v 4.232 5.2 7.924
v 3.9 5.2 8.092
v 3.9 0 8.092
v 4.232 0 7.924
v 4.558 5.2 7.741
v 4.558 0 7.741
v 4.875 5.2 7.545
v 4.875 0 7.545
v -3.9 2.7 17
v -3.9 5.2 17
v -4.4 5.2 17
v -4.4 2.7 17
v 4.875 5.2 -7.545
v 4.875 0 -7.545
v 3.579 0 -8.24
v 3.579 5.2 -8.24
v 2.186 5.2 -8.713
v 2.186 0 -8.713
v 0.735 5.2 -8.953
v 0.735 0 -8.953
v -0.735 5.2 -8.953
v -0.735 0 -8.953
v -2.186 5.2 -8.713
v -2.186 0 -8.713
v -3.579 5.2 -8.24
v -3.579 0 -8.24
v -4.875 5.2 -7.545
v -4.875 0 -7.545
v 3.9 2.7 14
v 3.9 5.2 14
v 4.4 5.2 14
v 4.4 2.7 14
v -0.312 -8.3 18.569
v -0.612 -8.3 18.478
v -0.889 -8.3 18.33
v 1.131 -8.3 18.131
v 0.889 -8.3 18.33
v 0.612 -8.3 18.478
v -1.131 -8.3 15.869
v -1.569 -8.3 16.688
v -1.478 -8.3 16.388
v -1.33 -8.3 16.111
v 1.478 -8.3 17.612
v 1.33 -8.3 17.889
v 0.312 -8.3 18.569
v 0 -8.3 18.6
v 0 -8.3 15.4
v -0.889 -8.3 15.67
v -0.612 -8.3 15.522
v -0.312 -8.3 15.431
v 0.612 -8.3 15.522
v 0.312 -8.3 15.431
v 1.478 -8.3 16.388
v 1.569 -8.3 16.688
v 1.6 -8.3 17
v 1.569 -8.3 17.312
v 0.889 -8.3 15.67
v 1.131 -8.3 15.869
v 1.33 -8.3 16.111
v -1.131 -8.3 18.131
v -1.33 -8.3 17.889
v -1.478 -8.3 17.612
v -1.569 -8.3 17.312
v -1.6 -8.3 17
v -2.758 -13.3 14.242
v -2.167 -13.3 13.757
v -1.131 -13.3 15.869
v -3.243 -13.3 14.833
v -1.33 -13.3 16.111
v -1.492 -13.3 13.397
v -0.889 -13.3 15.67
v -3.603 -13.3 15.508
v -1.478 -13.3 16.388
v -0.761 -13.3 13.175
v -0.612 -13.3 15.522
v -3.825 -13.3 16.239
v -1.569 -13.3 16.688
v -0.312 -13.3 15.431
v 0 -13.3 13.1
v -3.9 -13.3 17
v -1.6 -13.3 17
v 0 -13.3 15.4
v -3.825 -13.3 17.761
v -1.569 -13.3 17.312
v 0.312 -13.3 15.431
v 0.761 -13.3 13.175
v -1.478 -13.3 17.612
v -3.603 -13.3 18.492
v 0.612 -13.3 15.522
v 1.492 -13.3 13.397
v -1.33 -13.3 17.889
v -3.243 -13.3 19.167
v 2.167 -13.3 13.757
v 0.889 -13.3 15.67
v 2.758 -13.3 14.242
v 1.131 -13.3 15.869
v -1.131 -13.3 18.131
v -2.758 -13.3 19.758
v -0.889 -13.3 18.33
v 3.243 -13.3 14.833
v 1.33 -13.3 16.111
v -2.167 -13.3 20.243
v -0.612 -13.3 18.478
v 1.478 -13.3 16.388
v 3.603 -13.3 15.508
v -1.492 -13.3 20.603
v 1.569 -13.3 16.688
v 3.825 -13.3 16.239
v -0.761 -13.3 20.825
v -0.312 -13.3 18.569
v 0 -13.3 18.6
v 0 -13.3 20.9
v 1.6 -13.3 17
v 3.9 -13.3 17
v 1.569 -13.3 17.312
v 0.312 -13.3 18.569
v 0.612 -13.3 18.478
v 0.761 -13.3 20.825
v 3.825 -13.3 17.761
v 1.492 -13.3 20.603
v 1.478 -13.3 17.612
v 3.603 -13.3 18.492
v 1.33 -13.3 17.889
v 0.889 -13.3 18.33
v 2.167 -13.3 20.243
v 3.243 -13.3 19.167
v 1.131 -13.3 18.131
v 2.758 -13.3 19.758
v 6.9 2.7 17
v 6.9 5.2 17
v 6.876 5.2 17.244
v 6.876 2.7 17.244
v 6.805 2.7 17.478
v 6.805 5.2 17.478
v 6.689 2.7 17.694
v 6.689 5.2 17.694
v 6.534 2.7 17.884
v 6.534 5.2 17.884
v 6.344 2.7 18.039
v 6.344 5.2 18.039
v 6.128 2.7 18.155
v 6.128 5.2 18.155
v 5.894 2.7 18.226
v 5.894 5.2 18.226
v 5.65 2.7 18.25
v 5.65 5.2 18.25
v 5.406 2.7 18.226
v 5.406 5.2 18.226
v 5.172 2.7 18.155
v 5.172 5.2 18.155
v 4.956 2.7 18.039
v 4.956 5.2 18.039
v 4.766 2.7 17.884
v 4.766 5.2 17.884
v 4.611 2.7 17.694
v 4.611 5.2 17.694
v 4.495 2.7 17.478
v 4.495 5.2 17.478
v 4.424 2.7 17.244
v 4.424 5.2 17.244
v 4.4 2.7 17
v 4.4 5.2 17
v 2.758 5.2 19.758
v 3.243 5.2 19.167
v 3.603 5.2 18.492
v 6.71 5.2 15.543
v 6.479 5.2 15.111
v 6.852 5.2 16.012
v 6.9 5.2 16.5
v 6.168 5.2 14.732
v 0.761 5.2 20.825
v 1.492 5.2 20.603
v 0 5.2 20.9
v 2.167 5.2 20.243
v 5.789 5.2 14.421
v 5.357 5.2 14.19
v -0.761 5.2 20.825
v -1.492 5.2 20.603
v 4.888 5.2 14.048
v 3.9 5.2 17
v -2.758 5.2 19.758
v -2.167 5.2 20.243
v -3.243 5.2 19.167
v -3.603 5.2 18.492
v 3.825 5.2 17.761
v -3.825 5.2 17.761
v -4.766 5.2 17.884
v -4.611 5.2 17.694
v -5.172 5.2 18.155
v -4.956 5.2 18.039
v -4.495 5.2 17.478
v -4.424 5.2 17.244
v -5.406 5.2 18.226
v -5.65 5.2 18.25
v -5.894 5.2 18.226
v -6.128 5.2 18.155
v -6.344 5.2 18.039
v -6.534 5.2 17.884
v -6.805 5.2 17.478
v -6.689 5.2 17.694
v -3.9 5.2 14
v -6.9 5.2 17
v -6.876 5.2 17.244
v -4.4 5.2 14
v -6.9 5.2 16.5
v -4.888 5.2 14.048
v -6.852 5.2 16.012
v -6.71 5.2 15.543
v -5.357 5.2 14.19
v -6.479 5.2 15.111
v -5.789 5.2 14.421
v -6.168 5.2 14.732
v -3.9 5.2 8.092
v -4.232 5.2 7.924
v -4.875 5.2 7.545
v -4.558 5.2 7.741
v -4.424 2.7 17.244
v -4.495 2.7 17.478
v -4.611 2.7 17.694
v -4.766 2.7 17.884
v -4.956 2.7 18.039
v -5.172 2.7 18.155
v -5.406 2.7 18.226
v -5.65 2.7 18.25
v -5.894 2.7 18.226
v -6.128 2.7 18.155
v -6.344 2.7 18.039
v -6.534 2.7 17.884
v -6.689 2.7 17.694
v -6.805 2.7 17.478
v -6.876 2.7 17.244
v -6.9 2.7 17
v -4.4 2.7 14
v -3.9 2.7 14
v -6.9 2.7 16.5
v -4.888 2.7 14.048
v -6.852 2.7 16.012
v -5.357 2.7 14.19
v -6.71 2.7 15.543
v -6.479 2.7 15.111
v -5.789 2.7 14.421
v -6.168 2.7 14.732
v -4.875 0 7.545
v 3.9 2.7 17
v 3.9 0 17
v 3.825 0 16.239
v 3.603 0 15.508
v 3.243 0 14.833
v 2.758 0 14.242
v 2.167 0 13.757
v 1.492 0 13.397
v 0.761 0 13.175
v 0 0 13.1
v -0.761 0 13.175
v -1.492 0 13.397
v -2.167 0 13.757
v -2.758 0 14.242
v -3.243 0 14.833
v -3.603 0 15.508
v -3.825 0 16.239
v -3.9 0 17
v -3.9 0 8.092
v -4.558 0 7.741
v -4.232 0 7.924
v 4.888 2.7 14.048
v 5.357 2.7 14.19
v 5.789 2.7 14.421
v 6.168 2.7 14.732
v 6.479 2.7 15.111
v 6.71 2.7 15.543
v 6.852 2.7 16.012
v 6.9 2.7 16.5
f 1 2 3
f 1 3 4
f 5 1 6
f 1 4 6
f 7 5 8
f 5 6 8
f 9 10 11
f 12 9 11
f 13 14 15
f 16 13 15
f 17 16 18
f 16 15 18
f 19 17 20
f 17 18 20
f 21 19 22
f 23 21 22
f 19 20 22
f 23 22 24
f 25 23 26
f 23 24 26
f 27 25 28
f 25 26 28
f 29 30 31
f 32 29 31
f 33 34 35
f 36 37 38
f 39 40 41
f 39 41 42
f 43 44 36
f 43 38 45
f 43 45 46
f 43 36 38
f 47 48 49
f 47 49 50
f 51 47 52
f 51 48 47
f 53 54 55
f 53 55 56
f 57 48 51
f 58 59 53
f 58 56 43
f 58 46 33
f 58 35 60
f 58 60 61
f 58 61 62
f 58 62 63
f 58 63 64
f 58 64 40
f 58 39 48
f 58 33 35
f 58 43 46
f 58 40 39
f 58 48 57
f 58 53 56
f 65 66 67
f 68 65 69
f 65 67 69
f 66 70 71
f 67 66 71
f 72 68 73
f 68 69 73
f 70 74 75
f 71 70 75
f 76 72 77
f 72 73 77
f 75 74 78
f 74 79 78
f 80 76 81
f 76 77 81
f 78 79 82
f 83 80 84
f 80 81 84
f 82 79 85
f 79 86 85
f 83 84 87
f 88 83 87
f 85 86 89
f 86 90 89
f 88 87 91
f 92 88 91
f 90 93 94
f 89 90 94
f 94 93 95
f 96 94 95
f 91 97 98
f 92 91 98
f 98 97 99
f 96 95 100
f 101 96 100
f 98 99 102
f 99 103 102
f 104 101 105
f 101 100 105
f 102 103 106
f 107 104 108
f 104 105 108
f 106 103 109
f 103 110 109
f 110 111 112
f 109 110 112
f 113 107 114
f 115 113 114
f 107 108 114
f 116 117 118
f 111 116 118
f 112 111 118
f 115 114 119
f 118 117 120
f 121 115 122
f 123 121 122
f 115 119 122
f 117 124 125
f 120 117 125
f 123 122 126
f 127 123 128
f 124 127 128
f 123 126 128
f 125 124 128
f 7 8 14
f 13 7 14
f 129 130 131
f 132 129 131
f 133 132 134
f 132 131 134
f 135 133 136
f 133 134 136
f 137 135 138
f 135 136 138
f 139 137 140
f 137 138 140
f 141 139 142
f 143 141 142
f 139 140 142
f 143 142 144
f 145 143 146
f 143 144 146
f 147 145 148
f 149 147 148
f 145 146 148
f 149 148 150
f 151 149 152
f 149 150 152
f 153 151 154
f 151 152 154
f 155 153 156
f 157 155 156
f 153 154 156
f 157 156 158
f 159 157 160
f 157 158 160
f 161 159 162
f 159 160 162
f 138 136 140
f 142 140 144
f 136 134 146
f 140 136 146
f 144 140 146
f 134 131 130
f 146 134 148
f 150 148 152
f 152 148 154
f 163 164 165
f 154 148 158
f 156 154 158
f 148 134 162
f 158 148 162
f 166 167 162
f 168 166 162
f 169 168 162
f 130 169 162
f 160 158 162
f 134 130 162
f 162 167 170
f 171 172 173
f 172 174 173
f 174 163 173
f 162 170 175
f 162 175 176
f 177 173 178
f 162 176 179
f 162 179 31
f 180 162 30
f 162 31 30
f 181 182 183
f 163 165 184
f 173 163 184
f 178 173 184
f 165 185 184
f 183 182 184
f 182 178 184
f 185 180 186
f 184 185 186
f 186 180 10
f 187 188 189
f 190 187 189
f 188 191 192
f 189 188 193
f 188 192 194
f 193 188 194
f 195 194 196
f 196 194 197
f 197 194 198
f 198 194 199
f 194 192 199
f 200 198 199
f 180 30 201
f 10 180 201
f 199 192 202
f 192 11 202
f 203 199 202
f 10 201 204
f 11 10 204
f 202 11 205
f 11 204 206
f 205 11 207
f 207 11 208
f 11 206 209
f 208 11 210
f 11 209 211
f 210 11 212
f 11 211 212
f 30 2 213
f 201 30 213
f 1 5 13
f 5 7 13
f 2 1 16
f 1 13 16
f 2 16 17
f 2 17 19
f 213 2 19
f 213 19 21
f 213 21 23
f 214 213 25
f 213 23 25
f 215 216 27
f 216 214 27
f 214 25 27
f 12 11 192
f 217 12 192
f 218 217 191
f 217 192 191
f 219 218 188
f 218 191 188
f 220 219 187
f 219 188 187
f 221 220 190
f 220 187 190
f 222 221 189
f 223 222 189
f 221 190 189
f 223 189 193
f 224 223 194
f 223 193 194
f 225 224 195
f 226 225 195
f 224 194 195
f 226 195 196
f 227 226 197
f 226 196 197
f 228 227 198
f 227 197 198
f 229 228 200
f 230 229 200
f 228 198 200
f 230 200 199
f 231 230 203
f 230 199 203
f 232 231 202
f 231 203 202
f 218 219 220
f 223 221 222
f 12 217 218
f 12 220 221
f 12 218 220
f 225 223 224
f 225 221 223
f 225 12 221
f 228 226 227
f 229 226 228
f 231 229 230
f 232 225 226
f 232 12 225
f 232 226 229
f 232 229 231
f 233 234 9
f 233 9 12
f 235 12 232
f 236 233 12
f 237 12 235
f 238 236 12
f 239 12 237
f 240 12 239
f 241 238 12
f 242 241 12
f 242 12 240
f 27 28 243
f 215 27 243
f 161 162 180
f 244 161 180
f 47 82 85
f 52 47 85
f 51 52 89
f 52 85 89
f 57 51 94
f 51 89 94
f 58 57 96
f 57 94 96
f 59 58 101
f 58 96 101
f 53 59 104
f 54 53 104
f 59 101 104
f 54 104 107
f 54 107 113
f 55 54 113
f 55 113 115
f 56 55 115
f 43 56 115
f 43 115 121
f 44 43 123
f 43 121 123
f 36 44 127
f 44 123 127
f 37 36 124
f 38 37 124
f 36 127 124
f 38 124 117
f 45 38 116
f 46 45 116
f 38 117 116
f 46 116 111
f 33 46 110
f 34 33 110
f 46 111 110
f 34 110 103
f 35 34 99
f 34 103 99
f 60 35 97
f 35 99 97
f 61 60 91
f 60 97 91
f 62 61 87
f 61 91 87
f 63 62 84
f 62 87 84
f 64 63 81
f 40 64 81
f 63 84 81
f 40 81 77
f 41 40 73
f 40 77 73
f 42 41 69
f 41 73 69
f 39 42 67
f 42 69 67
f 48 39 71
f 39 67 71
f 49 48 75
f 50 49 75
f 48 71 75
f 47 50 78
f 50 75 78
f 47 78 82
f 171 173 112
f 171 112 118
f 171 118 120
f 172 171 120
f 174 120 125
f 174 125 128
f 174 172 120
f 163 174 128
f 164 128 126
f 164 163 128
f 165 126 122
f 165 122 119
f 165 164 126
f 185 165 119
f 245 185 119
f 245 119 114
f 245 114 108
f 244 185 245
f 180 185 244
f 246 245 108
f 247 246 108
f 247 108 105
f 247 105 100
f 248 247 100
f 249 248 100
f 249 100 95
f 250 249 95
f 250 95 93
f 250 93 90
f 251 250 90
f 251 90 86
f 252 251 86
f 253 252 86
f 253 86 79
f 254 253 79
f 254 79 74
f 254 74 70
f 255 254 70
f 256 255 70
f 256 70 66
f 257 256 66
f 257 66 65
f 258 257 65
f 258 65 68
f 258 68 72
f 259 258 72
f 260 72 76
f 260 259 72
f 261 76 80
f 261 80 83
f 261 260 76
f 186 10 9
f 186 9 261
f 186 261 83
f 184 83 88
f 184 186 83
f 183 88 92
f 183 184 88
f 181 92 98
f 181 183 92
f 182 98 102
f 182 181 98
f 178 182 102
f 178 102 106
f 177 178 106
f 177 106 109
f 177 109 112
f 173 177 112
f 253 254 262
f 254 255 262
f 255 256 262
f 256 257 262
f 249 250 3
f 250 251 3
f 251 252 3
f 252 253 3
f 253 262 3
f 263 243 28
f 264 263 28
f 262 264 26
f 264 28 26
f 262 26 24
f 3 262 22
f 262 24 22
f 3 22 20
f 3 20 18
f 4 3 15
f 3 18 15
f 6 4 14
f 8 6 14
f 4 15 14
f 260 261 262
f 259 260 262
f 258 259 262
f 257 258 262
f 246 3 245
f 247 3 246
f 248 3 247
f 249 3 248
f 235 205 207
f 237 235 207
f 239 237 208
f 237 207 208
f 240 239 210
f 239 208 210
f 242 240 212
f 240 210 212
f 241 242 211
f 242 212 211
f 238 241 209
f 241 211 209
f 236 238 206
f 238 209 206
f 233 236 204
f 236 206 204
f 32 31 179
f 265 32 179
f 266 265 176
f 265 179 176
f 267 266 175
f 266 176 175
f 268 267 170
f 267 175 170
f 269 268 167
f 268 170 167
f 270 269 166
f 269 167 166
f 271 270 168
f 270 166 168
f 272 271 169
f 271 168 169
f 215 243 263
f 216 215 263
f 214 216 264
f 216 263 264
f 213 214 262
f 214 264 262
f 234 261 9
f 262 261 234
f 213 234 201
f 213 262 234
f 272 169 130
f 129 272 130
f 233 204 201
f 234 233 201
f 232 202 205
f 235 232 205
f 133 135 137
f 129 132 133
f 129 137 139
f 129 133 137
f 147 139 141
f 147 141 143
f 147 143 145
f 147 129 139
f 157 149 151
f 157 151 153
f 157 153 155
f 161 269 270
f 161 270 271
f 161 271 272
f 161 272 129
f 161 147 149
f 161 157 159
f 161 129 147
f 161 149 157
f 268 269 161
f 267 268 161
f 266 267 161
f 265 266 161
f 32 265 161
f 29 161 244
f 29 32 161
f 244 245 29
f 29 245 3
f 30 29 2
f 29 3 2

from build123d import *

# Parameters (mm, degrees)
BOSS_EXTRUDE1_DEPTH = 5.2
SKETCH5_W           = 7.8
SKETCH5_H           = 5.2
BOSS_EXTRUDE2_DEPTH = 17
SKETCH6_R           = 3.9
BOSS_EXTRUDE3_DEPTH = 18.5
BOSS_EXTRUDE4_DEPTH = 2.5
SKETCH8_R           = 1.6
CUT_EXTRUDE1_DEPTH  = 5


with BuildPart() as part:
    # Sketch3 → Boss-Extrude1 (new body)
    with BuildSketch(Plane(origin=(0, 0, 0), x_dir=(1, 0, 0), z_dir=(0, 1, 0))):
        with BuildLine():
            Line((-4.875, 7.545253061), (-4.875, -7.545253061))
            ThreePointArc((-4.875, -7.545253061), (0, -8.983121325), (4.875, -7.545253061))
            Line((4.875, -7.545253061), (4.875, 7.545253061))
            ThreePointArc((4.875, 7.545253061), (0, 8.983121325), (-4.875, 7.545253061))
        make_face()
    extrude(amount=BOSS_EXTRUDE1_DEPTH)

    # Sketch5 → Boss-Extrude2 (add)
    with BuildSketch(Plane.XY):
        with Locations((0, 2.6)):
            Rectangle(SKETCH5_W, SKETCH5_H)
    extrude(amount=BOSS_EXTRUDE2_DEPTH)

    # Sketch6 → Boss-Extrude3 (add)
    with BuildSketch(Plane(origin=(0, 5.2, 0), x_dir=(1, 0, 0), z_dir=(0, 1, 0))):
        with Locations(Location((0, -17, 0), (0, 0, 270))):
            Circle(SKETCH6_R)
    extrude(amount=-BOSS_EXTRUDE3_DEPTH)

    # Sketch7 → Boss-Extrude4 (add)
    with BuildSketch(Plane(origin=(0, 5.2, 0), x_dir=(1, 0, 0), z_dir=(0, 1, 0))):
        with BuildLine():
            Line((-4.4, -14), (4.4, -14))
            ThreePointArc((4.4, -14), (6.167766953, -14.732233047), (6.9, -16.5))
            Line((6.9, -16.5), (6.9, -17))
            ThreePointArc((6.9, -17), (5.65, -18.25), (4.4, -17))
            Line((4.4, -17), (-4.4, -17))
            ThreePointArc((-4.4, -17), (-5.65, -18.25), (-6.9, -17))
            Line((-6.9, -17), (-6.9, -16.5))
            ThreePointArc((-6.9, -16.5), (-6.167766953, -14.732233047), (-4.4, -14))
        make_face()
    extrude(amount=-BOSS_EXTRUDE4_DEPTH)

    # Sketch8 → Cut-Extrude1 (cut)
    with BuildSketch(Plane.XZ.offset(13.3)):
        with Locations(Location((0, 17, 0), (0, 0, 270))):
            Circle(SKETCH8_R)
    extrude(amount=-CUT_EXTRUDE1_DEPTH, mode=Mode.SUBTRACT)


solid = part.part
